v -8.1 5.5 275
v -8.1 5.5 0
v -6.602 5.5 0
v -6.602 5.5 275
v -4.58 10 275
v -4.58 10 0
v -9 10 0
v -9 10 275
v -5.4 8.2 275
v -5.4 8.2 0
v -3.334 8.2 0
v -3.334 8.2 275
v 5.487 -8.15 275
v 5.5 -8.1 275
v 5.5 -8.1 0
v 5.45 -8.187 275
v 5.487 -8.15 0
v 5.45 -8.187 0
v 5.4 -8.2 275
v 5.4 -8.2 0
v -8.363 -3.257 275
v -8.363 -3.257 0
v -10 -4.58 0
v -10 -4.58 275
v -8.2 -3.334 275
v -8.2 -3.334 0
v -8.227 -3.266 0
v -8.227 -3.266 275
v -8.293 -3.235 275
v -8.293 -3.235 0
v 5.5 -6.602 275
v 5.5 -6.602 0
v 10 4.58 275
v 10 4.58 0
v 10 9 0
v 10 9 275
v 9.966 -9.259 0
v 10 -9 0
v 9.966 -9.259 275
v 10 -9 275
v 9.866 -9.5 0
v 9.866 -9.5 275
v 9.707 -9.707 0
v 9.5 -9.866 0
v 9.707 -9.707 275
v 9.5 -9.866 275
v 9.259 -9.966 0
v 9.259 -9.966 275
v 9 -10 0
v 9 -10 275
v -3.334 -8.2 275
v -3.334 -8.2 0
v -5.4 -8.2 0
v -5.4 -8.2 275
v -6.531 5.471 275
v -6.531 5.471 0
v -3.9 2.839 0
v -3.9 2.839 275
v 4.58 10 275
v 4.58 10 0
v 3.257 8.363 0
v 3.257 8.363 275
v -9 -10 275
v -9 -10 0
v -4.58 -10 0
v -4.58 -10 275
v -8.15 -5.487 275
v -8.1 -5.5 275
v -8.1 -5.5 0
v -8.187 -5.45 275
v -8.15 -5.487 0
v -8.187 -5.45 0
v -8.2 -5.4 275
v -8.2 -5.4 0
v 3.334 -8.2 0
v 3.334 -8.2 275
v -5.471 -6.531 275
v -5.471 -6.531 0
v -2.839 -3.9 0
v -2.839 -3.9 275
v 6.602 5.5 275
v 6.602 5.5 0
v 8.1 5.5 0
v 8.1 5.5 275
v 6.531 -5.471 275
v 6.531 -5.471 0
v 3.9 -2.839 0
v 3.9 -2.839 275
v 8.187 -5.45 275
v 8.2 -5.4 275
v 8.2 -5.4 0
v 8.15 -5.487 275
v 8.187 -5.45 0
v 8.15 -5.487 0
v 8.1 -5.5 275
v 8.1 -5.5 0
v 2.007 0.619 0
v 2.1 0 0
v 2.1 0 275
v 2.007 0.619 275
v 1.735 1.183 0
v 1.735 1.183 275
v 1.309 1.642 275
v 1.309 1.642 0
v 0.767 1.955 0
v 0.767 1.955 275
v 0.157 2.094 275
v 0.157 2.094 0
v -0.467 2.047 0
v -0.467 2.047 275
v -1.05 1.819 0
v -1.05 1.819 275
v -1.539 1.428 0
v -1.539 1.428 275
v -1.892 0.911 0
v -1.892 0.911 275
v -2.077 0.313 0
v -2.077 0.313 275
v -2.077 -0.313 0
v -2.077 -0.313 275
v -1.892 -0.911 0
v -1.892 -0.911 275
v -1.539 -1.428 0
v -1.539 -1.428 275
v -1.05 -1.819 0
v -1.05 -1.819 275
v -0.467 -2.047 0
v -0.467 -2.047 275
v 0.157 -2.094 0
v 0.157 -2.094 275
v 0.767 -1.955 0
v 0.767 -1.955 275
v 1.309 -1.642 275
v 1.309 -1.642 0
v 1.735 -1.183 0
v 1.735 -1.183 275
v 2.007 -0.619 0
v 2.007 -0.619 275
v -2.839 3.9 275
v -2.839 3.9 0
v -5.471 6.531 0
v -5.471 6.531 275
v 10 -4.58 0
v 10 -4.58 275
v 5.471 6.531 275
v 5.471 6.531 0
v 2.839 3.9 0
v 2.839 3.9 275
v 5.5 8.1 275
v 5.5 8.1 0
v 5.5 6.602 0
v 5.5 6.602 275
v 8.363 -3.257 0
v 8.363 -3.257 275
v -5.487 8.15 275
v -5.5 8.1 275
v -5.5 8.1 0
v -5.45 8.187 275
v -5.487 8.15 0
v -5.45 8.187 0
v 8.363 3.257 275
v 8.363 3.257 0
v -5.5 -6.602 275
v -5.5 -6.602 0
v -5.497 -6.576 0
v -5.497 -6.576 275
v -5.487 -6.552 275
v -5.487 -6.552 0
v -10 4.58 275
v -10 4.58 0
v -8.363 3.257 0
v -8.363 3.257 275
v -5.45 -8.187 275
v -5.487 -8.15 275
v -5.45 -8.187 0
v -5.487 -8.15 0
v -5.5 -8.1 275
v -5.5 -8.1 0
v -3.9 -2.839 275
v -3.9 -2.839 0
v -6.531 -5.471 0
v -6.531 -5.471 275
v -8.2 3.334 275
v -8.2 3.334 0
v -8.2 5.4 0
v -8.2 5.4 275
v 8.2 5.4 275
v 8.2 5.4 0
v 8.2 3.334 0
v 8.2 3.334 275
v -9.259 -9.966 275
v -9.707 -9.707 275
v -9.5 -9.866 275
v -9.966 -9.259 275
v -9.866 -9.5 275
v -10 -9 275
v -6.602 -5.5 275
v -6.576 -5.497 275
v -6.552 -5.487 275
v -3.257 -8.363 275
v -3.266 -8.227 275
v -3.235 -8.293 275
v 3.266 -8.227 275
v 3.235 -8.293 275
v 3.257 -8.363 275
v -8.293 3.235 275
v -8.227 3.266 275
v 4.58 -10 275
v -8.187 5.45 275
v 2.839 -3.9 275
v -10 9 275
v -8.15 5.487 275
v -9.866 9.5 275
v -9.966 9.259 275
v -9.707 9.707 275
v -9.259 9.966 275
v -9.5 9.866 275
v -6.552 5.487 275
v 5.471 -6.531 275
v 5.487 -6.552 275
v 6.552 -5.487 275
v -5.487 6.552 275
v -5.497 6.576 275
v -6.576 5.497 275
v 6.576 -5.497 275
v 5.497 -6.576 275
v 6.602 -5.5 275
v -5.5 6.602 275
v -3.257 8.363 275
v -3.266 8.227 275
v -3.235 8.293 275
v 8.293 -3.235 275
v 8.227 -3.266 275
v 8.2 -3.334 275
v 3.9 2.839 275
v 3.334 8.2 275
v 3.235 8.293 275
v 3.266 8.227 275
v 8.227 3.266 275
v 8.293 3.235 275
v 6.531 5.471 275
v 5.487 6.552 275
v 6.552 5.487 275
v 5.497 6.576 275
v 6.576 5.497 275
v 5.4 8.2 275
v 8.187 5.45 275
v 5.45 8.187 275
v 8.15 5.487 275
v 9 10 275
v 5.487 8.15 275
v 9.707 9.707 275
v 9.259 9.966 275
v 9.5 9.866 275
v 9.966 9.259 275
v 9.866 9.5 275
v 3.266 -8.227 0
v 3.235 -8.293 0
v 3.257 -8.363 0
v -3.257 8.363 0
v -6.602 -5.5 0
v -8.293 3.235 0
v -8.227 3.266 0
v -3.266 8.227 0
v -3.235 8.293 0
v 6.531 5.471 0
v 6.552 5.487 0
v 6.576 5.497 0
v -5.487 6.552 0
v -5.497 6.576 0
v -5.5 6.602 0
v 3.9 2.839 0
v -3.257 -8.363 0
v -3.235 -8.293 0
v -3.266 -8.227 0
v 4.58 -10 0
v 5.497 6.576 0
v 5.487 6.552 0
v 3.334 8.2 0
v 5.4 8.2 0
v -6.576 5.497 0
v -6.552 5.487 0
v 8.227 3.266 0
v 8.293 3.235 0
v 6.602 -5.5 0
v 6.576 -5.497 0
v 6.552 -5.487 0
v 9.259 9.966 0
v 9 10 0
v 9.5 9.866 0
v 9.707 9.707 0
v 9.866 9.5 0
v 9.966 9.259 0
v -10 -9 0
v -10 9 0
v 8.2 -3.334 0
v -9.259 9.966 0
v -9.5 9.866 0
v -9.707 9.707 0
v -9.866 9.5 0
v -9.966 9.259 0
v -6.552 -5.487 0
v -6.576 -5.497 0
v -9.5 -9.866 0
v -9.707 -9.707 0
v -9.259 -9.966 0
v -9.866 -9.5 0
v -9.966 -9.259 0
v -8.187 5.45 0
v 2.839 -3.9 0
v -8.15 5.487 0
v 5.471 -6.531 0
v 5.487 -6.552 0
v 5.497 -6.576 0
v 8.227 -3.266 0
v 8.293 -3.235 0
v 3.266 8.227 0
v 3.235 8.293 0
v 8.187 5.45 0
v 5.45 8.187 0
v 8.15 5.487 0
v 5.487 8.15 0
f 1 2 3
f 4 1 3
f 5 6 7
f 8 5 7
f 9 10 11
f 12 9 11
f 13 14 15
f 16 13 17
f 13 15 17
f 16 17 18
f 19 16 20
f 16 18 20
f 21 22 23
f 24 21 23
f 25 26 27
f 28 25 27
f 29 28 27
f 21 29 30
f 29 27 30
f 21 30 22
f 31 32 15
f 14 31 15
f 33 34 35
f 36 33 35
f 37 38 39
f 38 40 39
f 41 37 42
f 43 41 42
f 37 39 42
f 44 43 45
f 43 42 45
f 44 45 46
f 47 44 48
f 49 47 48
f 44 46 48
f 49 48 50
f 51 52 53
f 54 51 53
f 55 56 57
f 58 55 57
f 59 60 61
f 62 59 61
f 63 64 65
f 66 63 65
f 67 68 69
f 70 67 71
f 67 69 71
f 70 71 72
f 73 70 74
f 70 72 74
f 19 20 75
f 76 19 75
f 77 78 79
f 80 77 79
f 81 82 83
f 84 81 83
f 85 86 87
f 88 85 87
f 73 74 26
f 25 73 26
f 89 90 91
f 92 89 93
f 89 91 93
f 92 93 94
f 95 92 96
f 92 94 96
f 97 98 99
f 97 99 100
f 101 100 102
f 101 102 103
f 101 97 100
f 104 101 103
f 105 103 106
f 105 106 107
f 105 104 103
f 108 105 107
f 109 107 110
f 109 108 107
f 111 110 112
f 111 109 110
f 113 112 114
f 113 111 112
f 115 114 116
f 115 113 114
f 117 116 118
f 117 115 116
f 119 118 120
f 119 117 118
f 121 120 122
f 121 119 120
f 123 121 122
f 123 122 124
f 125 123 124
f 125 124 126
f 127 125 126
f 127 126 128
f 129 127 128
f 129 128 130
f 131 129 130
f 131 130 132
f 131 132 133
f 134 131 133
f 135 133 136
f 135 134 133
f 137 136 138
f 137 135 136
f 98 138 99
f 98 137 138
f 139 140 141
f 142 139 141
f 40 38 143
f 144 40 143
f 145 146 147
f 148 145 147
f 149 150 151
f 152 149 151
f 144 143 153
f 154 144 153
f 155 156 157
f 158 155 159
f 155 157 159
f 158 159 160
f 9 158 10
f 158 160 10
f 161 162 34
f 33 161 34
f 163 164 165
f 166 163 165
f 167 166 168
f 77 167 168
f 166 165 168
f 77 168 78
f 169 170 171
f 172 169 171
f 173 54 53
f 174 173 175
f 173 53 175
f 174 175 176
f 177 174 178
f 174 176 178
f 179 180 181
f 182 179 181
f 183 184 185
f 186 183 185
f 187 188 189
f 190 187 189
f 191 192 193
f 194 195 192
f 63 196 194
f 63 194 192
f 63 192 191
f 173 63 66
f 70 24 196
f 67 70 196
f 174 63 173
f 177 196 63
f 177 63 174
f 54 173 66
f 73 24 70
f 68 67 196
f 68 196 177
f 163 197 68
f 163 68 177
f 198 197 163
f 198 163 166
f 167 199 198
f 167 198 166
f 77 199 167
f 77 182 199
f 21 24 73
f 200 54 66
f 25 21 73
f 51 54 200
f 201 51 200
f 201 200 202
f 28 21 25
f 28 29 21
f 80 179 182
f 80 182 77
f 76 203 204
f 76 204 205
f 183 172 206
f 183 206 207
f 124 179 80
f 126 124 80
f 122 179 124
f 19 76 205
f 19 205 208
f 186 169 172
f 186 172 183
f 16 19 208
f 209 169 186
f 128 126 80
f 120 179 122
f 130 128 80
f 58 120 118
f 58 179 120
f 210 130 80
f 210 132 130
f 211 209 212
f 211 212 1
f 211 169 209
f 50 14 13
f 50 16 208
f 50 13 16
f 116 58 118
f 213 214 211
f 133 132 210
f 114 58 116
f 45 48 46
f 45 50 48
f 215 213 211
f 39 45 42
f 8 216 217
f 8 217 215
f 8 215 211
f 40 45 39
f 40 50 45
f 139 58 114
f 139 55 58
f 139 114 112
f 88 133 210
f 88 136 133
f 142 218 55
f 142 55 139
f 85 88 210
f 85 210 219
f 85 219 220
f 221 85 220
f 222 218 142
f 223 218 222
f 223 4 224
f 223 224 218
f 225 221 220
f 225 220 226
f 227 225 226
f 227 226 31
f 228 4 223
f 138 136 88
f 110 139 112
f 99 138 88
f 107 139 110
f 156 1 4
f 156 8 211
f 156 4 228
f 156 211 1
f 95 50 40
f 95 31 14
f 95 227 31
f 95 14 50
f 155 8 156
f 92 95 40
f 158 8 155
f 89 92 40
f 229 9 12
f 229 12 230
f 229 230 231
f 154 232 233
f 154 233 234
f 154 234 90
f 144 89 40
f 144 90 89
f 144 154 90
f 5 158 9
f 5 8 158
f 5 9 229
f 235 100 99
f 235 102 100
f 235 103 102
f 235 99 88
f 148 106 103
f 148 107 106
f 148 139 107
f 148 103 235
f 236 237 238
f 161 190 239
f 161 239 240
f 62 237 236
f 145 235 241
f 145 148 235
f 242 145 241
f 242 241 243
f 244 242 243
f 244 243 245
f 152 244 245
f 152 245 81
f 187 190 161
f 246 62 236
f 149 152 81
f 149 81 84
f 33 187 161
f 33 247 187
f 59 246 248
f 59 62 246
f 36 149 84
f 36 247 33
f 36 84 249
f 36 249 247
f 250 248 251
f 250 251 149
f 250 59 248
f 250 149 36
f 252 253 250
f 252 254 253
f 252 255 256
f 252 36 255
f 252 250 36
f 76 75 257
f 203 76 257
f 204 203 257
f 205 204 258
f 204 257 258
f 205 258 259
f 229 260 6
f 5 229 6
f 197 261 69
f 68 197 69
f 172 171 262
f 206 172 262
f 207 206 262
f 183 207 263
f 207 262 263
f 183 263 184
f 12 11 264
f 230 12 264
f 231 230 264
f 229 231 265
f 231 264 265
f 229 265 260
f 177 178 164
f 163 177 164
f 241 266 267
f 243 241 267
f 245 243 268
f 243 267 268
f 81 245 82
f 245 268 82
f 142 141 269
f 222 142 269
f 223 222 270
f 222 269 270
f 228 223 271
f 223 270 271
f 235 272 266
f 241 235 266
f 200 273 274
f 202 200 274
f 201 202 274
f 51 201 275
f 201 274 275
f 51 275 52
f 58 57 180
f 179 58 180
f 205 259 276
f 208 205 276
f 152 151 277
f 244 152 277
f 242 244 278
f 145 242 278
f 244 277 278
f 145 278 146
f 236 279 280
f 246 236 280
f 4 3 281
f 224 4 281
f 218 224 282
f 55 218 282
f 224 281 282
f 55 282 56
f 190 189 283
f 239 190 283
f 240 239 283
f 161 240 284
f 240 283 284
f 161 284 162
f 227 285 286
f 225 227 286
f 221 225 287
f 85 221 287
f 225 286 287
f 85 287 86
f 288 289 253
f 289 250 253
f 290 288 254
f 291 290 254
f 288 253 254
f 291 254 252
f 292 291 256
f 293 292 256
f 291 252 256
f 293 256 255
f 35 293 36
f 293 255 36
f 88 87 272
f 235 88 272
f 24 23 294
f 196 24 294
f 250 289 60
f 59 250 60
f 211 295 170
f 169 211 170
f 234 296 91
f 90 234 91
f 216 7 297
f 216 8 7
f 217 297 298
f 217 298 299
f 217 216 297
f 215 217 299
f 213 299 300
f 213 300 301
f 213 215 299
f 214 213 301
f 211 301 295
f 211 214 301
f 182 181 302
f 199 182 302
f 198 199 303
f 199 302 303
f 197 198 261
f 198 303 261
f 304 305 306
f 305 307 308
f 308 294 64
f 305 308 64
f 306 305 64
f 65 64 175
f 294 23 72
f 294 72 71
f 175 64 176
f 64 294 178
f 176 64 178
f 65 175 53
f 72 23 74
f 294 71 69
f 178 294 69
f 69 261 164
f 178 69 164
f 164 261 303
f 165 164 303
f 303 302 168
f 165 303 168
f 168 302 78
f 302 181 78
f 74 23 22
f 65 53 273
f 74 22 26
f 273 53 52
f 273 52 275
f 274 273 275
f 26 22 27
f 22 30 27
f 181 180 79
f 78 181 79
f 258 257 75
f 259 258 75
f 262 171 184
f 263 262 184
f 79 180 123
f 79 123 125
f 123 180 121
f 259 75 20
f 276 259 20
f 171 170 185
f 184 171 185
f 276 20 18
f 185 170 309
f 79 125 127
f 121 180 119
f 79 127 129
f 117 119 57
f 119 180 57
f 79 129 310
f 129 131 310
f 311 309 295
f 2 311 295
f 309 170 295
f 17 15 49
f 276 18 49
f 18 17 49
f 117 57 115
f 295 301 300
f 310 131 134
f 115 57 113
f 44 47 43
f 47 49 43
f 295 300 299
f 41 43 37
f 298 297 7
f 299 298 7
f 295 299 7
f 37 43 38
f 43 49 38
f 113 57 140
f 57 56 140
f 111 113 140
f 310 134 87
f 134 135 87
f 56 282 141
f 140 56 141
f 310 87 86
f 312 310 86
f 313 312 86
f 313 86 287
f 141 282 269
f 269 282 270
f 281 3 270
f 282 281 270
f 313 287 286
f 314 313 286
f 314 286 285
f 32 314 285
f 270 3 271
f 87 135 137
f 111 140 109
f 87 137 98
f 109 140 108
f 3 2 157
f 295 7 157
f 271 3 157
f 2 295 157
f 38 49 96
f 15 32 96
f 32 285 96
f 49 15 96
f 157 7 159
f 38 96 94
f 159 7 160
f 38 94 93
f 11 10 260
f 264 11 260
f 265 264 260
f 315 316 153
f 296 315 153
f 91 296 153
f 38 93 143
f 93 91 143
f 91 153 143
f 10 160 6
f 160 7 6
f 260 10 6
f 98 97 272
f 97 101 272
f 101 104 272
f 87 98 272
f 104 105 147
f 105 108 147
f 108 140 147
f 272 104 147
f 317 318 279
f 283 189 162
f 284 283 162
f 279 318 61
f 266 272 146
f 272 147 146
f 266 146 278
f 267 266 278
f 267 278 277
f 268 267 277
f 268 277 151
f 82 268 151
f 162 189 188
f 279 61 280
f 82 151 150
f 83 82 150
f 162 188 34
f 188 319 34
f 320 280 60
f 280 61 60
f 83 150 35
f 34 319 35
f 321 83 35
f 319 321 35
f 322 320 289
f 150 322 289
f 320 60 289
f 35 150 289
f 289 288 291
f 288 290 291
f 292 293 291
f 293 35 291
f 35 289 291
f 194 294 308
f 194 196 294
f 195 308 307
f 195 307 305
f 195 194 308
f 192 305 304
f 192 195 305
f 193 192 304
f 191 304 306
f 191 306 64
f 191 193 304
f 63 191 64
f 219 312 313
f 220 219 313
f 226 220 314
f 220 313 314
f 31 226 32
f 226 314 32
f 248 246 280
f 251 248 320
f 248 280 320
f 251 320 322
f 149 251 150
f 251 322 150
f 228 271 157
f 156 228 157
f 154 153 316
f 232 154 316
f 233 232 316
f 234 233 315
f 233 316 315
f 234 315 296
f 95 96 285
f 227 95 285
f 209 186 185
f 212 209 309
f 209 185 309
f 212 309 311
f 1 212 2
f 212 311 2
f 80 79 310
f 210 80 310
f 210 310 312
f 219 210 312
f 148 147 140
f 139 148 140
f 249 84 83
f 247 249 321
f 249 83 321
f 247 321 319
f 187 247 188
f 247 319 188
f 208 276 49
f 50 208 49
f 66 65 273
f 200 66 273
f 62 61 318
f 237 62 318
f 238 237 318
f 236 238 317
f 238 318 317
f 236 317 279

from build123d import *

# Parameters (mm, degrees)
SKETCH1_R           = 2.1
BOSS_EXTRUDE1_DEPTH = 275
FILLET1_R           = 1


with BuildPart() as part:
    # Sketch1 → Boss-Extrude1 (new body)
    with BuildSketch(Plane.XY):
        with BuildLine():
            Line((-2.839339828, 3.9), (-5.470710678, 6.53137085))
            ThreePointArc((-5.470710678, 6.53137085), (-5.492387953, 6.563813185), (-5.5, 6.602081528))
            Line((-5.5, 6.602081528), (-5.5, 8.1))
            ThreePointArc((-5.5, 8.1), (-5.470710678, 8.170710678), (-5.4, 8.2))
            Line((-5.4, 8.2), (-3.334418044, 8.2))
            ThreePointArc((-3.334418044, 8.2), (-3.244178397, 8.256909326), (-3.2566483, 8.362863876))
            Line((-3.2566483, 8.362863876), (-4.58, 10))
            Line((-4.58, 10), (-10, 10))
            Line((-10, 10), (-10, 4.58))
            Line((-10, 4.58), (-8.362863876, 3.2566483))
            ThreePointArc((-8.362863876, 3.2566483), (-8.256909326, 3.244178397), (-8.2, 3.334418044))
            Line((-8.2, 3.334418044), (-8.2, 5.4))
            ThreePointArc((-8.2, 5.4), (-8.170710678, 5.470710678), (-8.1, 5.5))
            Line((-8.1, 5.5), (-6.602081528, 5.5))
            ThreePointArc((-6.602081528, 5.5), (-6.563813185, 5.492387953), (-6.53137085, 5.470710678))
            Line((-6.53137085, 5.470710678), (-3.9, 2.839339828))
            Line((-3.9, 2.839339828), (-3.9, -2.839339828))
            Line((-3.9, -2.839339828), (-6.53137085, -5.470710678))
            ThreePointArc((-6.53137085, -5.470710678), (-6.563813185, -5.492387953), (-6.602081528, -5.5))
            Line((-6.602081528, -5.5), (-8.1, -5.5))
            ThreePointArc((-8.1, -5.5), (-8.170710678, -5.470710678), (-8.2, -5.4))
            Line((-8.2, -5.4), (-8.2, -3.334418044))
            ThreePointArc((-8.2, -3.334418044), (-8.256909326, -3.244178397), (-8.362863876, -3.2566483))
            Line((-8.362863876, -3.2566483), (-10, -4.58))
            Line((-10, -4.58), (-10, -10))
            Line((-10, -10), (-4.58, -10))
            Line((-4.58, -10), (-3.2566483, -8.362863876))
            ThreePointArc((-3.2566483, -8.362863876), (-3.244178397, -8.256909326), (-3.334418044, -8.2))
            Line((-3.334418044, -8.2), (-5.4, -8.2))
            ThreePointArc((-5.4, -8.2), (-5.470710678, -8.170710678), (-5.5, -8.1))
            Line((-5.5, -8.1), (-5.5, -6.602081528))
            ThreePointArc((-5.5, -6.602081528), (-5.492387953, -6.563813185), (-5.470710678, -6.53137085))
            Line((-5.470710678, -6.53137085), (-2.839339828, -3.9))
            Line((-2.839339828, -3.9), (2.839339828, -3.9))
            Line((2.839339828, -3.9), (5.470710678, -6.53137085))
            ThreePointArc((5.470710678, -6.53137085), (5.492387953, -6.563813185), (5.5, -6.602081528))
            Line((5.5, -6.602081528), (5.5, -8.1))
            ThreePointArc((5.5, -8.1), (5.470710678, -8.170710678), (5.4, -8.2))
            Line((5.4, -8.2), (3.334418044, -8.2))
            ThreePointArc((3.334418044, -8.2), (3.244178397, -8.256909326), (3.2566483, -8.362863876))
            Line((3.2566483, -8.362863876), (4.58, -10))
            Line((4.58, -10), (10, -10))
            Line((10, -10), (10, -4.58))
            Line((10, -4.58), (8.362863876, -3.2566483))
            ThreePointArc((8.362863876, -3.2566483), (8.256909326, -3.244178397), (8.2, -3.334418044))
            Line((8.2, -3.334418044), (8.2, -5.4))
            ThreePointArc((8.2, -5.4), (8.170710678, -5.470710678), (8.1, -5.5))
            Line((8.1, -5.5), (6.602081528, -5.5))
            ThreePointArc((6.602081528, -5.5), (6.563813185, -5.492387953), (6.53137085, -5.470710678))
            Line((6.53137085, -5.470710678), (3.9, -2.839339828))
            Line((3.9, -2.839339828), (3.9, 2.839339828))
            Line((3.9, 2.839339828), (6.53137085, 5.470710678))
            ThreePointArc((6.53137085, 5.470710678), (6.563813185, 5.492387953), (6.602081528, 5.5))
            Line((6.602081528, 5.5), (8.1, 5.5))
            ThreePointArc((8.1, 5.5), (8.170710678, 5.470710678), (8.2, 5.4))
            Line((8.2, 5.4), (8.2, 3.334418044))
            ThreePointArc((8.2, 3.334418044), (8.256909326, 3.244178397), (8.362863876, 3.2566483))
            Line((8.362863876, 3.2566483), (10, 4.58))
            Line((10, 4.58), (10, 10))
            Line((10, 10), (4.58, 10))
            Line((4.58, 10), (3.2566483, 8.362863876))
            ThreePointArc((3.2566483, 8.362863876), (3.244178397, 8.256909326), (3.334418044, 8.2))
            Line((3.334418044, 8.2), (5.4, 8.2))
            ThreePointArc((5.4, 8.2), (5.470710678, 8.170710678), (5.5, 8.1))
            Line((5.5, 8.1), (5.5, 6.602081528))
            ThreePointArc((5.5, 6.602081528), (5.492387953, 6.563813185), (5.470710678, 6.53137085))
            Line((5.470710678, 6.53137085), (2.839339828, 3.9))
            Line((2.839339828, 3.9), (-2.839339828, 3.9))
        make_face()
        Circle(SKETCH1_R, mode=Mode.SUBTRACT)
    extrude(amount=BOSS_EXTRUDE1_DEPTH)

    # Fillet1
    fillet1_edges = [part.edges().sort_by_distance(p)[0] for p in [
        (10, -10, 137.5),
        (-10, -10, 137.5),
        (-10, 10, 137.5),
        (10, 10, 137.5),
    ]]
    fillet(fillet1_edges, radius=FILLET1_R)


solid = part.part
